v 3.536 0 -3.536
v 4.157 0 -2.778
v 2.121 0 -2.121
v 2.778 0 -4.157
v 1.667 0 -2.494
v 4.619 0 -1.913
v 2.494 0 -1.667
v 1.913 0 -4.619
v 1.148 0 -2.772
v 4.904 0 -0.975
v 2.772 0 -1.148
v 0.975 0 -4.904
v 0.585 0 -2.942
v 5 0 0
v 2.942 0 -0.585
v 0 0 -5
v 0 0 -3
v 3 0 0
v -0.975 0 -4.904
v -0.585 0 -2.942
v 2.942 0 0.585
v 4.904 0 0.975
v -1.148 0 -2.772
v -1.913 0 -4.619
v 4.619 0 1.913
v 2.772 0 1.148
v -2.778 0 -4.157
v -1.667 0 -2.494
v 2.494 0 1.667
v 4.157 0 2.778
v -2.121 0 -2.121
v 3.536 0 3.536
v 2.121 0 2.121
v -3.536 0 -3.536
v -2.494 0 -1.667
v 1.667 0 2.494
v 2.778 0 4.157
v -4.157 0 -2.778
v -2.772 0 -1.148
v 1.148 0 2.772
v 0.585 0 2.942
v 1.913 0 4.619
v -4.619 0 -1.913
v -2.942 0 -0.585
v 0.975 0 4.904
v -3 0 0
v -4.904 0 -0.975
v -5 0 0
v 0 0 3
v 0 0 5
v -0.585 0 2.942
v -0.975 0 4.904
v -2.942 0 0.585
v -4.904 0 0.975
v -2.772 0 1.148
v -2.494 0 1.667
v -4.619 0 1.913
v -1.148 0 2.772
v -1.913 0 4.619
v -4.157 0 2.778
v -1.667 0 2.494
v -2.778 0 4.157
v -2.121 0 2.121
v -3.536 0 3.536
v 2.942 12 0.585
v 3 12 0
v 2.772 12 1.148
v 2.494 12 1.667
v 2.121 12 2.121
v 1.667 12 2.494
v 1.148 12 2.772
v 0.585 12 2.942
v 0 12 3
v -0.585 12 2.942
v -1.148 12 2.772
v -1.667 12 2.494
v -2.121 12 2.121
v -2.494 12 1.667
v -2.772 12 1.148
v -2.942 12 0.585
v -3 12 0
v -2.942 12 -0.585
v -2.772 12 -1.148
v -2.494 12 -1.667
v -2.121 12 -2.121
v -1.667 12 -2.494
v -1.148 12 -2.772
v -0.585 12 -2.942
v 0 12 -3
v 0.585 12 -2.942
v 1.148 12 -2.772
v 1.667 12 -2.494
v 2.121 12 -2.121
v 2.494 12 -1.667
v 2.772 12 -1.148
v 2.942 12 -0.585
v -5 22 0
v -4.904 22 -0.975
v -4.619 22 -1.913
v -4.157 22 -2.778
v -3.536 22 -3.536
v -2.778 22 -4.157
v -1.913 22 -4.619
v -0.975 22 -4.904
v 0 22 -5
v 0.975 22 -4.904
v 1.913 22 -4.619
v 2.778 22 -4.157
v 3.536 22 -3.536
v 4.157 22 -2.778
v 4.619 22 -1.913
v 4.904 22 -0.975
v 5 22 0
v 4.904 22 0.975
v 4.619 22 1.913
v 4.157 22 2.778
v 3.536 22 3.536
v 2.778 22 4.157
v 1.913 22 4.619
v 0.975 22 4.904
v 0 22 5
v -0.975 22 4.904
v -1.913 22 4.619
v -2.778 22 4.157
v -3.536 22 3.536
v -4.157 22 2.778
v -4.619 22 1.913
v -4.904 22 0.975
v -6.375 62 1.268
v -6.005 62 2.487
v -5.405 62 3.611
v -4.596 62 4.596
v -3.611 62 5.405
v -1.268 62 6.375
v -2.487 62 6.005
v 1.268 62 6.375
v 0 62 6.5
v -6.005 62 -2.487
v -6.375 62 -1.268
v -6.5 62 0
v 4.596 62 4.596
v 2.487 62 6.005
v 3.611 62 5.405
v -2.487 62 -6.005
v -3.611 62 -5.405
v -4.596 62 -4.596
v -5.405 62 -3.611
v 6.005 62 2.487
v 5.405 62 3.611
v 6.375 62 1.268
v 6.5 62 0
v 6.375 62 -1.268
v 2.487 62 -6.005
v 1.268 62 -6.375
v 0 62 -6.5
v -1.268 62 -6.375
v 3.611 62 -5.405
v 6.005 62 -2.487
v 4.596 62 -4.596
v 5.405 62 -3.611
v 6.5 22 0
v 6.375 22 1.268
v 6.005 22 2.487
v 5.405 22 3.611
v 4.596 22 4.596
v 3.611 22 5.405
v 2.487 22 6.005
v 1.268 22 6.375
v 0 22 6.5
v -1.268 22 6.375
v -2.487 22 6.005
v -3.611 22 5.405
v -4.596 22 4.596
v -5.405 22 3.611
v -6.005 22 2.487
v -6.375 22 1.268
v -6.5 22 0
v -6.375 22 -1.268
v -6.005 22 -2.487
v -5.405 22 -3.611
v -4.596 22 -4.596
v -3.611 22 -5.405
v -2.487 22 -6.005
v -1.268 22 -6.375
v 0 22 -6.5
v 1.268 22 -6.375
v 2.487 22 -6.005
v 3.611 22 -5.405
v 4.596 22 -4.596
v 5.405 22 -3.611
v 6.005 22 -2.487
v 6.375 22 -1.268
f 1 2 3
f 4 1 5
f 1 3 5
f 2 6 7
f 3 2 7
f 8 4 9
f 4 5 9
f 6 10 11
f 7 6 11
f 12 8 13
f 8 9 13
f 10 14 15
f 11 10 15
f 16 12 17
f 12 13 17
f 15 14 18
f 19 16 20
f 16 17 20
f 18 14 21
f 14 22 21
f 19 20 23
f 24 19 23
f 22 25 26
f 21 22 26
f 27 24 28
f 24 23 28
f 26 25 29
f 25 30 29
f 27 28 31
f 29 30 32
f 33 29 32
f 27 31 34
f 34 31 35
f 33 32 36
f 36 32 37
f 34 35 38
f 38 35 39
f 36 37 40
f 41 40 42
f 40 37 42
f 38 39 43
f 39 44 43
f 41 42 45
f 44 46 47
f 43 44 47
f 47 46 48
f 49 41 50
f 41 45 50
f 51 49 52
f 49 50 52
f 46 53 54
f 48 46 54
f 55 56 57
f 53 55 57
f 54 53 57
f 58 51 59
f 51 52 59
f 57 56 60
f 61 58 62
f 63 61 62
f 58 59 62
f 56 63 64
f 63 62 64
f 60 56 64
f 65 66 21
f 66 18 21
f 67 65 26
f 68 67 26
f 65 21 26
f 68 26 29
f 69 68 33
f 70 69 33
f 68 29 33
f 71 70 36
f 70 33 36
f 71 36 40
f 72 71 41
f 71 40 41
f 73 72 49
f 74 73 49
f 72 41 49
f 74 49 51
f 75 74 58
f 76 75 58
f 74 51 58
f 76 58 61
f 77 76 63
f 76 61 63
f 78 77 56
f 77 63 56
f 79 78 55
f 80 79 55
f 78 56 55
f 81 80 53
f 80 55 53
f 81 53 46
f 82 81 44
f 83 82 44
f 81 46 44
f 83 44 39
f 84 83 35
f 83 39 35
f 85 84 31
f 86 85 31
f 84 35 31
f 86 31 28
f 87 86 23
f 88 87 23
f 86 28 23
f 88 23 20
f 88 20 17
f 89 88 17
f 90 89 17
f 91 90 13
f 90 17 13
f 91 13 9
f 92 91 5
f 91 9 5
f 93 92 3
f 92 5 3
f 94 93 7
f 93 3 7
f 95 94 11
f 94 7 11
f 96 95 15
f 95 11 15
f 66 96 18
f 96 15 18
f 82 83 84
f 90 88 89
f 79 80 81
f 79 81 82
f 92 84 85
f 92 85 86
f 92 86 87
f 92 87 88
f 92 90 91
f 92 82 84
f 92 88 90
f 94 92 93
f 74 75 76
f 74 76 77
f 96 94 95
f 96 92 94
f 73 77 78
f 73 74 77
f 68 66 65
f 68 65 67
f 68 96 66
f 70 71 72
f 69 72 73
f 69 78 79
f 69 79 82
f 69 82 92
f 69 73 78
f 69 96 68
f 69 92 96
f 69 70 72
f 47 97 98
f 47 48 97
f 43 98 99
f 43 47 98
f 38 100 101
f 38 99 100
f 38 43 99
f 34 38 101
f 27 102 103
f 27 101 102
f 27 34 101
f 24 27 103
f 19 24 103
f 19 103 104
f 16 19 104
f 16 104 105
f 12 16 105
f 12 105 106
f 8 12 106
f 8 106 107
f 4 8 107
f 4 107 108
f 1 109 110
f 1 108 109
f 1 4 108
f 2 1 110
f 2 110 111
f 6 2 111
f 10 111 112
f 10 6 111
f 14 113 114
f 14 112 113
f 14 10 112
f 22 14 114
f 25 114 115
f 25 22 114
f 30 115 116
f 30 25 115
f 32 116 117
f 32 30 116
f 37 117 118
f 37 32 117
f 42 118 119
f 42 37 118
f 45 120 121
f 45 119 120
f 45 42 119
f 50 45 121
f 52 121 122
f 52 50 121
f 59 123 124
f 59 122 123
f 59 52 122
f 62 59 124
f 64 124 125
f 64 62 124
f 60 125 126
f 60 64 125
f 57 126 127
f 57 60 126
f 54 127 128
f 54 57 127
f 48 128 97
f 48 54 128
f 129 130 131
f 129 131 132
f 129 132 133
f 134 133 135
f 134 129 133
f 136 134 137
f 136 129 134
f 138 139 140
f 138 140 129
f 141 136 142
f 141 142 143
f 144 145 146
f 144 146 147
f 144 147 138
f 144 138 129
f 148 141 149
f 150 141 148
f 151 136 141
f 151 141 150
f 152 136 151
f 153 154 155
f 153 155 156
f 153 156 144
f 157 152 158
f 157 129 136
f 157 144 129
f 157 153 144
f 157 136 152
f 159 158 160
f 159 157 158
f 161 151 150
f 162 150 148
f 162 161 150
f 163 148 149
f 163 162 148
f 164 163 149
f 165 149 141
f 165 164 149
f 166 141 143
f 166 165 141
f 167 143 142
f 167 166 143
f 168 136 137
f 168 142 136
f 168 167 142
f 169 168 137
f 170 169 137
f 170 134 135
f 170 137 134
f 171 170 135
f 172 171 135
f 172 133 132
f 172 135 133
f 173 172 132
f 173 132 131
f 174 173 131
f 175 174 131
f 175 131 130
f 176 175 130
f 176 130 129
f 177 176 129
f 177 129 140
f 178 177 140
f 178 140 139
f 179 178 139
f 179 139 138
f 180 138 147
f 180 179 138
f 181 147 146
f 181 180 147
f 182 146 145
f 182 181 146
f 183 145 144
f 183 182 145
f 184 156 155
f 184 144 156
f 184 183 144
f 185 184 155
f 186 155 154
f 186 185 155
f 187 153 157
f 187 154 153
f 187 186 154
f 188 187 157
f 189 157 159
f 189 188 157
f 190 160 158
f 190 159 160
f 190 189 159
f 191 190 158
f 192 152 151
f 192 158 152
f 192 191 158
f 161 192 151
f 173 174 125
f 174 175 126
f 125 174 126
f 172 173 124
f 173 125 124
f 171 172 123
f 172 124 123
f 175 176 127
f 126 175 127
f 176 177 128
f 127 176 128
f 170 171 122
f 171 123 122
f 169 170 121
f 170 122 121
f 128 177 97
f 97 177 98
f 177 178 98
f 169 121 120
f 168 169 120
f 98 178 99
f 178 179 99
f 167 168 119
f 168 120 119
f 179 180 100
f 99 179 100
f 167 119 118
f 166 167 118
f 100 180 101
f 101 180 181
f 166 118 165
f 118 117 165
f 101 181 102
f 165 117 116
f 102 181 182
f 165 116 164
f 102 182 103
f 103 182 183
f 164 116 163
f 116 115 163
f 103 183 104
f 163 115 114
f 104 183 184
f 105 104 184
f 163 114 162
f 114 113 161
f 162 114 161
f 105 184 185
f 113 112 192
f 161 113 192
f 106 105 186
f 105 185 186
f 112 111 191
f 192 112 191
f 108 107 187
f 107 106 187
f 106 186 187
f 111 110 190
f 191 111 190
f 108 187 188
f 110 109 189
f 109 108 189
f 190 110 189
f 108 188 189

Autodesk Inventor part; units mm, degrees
ref_plane "YZ Plane" through (0, 0, 0) normal (1, 0, 0) x (0, 1, 0)
ref_plane "XZ Plane" through (0, 0, 0) normal (0, 1, 0) x (-1, 0, 0)
ref_plane "XY Plane" through (0, 0, 0) normal (0, 0, 1) x (1, 0, 0)
sketch "スケッチ1" plane through (0, 0, 0) normal (0, 1, 0) x (-1, 0, 0)
  circle A0 centre (0, 0) radius 5
  dimension "d0" = 10
extrude "押し出し1" add sketch "スケッチ1" along normal blind 22
sketch "スケッチ2" plane through (0, 22, 0) normal (0, 1, 0) x (1, 0, 0)
  circle A0 centre (0, 0) radius 6.5
  dimension "d3" = 13
extrude "押し出し2" add sketch "スケッチ2" along normal blind 40
sketch "スケッチ3" plane through (0, 62, 0) normal (0, 1, 0) x (1, 0, 0)
  point P0 (0, 0)
sketch "スケッチ4" plane through (0, 0, 0) normal (0, -1, 0) x (1, 0, 0)
  circle A0 centre (0, 0) radius 3
  dimension "d6" = 6
extrude "押し出し3" cut sketch "スケッチ4" against normal blind 12
properties part number "shaft-k-ki"
